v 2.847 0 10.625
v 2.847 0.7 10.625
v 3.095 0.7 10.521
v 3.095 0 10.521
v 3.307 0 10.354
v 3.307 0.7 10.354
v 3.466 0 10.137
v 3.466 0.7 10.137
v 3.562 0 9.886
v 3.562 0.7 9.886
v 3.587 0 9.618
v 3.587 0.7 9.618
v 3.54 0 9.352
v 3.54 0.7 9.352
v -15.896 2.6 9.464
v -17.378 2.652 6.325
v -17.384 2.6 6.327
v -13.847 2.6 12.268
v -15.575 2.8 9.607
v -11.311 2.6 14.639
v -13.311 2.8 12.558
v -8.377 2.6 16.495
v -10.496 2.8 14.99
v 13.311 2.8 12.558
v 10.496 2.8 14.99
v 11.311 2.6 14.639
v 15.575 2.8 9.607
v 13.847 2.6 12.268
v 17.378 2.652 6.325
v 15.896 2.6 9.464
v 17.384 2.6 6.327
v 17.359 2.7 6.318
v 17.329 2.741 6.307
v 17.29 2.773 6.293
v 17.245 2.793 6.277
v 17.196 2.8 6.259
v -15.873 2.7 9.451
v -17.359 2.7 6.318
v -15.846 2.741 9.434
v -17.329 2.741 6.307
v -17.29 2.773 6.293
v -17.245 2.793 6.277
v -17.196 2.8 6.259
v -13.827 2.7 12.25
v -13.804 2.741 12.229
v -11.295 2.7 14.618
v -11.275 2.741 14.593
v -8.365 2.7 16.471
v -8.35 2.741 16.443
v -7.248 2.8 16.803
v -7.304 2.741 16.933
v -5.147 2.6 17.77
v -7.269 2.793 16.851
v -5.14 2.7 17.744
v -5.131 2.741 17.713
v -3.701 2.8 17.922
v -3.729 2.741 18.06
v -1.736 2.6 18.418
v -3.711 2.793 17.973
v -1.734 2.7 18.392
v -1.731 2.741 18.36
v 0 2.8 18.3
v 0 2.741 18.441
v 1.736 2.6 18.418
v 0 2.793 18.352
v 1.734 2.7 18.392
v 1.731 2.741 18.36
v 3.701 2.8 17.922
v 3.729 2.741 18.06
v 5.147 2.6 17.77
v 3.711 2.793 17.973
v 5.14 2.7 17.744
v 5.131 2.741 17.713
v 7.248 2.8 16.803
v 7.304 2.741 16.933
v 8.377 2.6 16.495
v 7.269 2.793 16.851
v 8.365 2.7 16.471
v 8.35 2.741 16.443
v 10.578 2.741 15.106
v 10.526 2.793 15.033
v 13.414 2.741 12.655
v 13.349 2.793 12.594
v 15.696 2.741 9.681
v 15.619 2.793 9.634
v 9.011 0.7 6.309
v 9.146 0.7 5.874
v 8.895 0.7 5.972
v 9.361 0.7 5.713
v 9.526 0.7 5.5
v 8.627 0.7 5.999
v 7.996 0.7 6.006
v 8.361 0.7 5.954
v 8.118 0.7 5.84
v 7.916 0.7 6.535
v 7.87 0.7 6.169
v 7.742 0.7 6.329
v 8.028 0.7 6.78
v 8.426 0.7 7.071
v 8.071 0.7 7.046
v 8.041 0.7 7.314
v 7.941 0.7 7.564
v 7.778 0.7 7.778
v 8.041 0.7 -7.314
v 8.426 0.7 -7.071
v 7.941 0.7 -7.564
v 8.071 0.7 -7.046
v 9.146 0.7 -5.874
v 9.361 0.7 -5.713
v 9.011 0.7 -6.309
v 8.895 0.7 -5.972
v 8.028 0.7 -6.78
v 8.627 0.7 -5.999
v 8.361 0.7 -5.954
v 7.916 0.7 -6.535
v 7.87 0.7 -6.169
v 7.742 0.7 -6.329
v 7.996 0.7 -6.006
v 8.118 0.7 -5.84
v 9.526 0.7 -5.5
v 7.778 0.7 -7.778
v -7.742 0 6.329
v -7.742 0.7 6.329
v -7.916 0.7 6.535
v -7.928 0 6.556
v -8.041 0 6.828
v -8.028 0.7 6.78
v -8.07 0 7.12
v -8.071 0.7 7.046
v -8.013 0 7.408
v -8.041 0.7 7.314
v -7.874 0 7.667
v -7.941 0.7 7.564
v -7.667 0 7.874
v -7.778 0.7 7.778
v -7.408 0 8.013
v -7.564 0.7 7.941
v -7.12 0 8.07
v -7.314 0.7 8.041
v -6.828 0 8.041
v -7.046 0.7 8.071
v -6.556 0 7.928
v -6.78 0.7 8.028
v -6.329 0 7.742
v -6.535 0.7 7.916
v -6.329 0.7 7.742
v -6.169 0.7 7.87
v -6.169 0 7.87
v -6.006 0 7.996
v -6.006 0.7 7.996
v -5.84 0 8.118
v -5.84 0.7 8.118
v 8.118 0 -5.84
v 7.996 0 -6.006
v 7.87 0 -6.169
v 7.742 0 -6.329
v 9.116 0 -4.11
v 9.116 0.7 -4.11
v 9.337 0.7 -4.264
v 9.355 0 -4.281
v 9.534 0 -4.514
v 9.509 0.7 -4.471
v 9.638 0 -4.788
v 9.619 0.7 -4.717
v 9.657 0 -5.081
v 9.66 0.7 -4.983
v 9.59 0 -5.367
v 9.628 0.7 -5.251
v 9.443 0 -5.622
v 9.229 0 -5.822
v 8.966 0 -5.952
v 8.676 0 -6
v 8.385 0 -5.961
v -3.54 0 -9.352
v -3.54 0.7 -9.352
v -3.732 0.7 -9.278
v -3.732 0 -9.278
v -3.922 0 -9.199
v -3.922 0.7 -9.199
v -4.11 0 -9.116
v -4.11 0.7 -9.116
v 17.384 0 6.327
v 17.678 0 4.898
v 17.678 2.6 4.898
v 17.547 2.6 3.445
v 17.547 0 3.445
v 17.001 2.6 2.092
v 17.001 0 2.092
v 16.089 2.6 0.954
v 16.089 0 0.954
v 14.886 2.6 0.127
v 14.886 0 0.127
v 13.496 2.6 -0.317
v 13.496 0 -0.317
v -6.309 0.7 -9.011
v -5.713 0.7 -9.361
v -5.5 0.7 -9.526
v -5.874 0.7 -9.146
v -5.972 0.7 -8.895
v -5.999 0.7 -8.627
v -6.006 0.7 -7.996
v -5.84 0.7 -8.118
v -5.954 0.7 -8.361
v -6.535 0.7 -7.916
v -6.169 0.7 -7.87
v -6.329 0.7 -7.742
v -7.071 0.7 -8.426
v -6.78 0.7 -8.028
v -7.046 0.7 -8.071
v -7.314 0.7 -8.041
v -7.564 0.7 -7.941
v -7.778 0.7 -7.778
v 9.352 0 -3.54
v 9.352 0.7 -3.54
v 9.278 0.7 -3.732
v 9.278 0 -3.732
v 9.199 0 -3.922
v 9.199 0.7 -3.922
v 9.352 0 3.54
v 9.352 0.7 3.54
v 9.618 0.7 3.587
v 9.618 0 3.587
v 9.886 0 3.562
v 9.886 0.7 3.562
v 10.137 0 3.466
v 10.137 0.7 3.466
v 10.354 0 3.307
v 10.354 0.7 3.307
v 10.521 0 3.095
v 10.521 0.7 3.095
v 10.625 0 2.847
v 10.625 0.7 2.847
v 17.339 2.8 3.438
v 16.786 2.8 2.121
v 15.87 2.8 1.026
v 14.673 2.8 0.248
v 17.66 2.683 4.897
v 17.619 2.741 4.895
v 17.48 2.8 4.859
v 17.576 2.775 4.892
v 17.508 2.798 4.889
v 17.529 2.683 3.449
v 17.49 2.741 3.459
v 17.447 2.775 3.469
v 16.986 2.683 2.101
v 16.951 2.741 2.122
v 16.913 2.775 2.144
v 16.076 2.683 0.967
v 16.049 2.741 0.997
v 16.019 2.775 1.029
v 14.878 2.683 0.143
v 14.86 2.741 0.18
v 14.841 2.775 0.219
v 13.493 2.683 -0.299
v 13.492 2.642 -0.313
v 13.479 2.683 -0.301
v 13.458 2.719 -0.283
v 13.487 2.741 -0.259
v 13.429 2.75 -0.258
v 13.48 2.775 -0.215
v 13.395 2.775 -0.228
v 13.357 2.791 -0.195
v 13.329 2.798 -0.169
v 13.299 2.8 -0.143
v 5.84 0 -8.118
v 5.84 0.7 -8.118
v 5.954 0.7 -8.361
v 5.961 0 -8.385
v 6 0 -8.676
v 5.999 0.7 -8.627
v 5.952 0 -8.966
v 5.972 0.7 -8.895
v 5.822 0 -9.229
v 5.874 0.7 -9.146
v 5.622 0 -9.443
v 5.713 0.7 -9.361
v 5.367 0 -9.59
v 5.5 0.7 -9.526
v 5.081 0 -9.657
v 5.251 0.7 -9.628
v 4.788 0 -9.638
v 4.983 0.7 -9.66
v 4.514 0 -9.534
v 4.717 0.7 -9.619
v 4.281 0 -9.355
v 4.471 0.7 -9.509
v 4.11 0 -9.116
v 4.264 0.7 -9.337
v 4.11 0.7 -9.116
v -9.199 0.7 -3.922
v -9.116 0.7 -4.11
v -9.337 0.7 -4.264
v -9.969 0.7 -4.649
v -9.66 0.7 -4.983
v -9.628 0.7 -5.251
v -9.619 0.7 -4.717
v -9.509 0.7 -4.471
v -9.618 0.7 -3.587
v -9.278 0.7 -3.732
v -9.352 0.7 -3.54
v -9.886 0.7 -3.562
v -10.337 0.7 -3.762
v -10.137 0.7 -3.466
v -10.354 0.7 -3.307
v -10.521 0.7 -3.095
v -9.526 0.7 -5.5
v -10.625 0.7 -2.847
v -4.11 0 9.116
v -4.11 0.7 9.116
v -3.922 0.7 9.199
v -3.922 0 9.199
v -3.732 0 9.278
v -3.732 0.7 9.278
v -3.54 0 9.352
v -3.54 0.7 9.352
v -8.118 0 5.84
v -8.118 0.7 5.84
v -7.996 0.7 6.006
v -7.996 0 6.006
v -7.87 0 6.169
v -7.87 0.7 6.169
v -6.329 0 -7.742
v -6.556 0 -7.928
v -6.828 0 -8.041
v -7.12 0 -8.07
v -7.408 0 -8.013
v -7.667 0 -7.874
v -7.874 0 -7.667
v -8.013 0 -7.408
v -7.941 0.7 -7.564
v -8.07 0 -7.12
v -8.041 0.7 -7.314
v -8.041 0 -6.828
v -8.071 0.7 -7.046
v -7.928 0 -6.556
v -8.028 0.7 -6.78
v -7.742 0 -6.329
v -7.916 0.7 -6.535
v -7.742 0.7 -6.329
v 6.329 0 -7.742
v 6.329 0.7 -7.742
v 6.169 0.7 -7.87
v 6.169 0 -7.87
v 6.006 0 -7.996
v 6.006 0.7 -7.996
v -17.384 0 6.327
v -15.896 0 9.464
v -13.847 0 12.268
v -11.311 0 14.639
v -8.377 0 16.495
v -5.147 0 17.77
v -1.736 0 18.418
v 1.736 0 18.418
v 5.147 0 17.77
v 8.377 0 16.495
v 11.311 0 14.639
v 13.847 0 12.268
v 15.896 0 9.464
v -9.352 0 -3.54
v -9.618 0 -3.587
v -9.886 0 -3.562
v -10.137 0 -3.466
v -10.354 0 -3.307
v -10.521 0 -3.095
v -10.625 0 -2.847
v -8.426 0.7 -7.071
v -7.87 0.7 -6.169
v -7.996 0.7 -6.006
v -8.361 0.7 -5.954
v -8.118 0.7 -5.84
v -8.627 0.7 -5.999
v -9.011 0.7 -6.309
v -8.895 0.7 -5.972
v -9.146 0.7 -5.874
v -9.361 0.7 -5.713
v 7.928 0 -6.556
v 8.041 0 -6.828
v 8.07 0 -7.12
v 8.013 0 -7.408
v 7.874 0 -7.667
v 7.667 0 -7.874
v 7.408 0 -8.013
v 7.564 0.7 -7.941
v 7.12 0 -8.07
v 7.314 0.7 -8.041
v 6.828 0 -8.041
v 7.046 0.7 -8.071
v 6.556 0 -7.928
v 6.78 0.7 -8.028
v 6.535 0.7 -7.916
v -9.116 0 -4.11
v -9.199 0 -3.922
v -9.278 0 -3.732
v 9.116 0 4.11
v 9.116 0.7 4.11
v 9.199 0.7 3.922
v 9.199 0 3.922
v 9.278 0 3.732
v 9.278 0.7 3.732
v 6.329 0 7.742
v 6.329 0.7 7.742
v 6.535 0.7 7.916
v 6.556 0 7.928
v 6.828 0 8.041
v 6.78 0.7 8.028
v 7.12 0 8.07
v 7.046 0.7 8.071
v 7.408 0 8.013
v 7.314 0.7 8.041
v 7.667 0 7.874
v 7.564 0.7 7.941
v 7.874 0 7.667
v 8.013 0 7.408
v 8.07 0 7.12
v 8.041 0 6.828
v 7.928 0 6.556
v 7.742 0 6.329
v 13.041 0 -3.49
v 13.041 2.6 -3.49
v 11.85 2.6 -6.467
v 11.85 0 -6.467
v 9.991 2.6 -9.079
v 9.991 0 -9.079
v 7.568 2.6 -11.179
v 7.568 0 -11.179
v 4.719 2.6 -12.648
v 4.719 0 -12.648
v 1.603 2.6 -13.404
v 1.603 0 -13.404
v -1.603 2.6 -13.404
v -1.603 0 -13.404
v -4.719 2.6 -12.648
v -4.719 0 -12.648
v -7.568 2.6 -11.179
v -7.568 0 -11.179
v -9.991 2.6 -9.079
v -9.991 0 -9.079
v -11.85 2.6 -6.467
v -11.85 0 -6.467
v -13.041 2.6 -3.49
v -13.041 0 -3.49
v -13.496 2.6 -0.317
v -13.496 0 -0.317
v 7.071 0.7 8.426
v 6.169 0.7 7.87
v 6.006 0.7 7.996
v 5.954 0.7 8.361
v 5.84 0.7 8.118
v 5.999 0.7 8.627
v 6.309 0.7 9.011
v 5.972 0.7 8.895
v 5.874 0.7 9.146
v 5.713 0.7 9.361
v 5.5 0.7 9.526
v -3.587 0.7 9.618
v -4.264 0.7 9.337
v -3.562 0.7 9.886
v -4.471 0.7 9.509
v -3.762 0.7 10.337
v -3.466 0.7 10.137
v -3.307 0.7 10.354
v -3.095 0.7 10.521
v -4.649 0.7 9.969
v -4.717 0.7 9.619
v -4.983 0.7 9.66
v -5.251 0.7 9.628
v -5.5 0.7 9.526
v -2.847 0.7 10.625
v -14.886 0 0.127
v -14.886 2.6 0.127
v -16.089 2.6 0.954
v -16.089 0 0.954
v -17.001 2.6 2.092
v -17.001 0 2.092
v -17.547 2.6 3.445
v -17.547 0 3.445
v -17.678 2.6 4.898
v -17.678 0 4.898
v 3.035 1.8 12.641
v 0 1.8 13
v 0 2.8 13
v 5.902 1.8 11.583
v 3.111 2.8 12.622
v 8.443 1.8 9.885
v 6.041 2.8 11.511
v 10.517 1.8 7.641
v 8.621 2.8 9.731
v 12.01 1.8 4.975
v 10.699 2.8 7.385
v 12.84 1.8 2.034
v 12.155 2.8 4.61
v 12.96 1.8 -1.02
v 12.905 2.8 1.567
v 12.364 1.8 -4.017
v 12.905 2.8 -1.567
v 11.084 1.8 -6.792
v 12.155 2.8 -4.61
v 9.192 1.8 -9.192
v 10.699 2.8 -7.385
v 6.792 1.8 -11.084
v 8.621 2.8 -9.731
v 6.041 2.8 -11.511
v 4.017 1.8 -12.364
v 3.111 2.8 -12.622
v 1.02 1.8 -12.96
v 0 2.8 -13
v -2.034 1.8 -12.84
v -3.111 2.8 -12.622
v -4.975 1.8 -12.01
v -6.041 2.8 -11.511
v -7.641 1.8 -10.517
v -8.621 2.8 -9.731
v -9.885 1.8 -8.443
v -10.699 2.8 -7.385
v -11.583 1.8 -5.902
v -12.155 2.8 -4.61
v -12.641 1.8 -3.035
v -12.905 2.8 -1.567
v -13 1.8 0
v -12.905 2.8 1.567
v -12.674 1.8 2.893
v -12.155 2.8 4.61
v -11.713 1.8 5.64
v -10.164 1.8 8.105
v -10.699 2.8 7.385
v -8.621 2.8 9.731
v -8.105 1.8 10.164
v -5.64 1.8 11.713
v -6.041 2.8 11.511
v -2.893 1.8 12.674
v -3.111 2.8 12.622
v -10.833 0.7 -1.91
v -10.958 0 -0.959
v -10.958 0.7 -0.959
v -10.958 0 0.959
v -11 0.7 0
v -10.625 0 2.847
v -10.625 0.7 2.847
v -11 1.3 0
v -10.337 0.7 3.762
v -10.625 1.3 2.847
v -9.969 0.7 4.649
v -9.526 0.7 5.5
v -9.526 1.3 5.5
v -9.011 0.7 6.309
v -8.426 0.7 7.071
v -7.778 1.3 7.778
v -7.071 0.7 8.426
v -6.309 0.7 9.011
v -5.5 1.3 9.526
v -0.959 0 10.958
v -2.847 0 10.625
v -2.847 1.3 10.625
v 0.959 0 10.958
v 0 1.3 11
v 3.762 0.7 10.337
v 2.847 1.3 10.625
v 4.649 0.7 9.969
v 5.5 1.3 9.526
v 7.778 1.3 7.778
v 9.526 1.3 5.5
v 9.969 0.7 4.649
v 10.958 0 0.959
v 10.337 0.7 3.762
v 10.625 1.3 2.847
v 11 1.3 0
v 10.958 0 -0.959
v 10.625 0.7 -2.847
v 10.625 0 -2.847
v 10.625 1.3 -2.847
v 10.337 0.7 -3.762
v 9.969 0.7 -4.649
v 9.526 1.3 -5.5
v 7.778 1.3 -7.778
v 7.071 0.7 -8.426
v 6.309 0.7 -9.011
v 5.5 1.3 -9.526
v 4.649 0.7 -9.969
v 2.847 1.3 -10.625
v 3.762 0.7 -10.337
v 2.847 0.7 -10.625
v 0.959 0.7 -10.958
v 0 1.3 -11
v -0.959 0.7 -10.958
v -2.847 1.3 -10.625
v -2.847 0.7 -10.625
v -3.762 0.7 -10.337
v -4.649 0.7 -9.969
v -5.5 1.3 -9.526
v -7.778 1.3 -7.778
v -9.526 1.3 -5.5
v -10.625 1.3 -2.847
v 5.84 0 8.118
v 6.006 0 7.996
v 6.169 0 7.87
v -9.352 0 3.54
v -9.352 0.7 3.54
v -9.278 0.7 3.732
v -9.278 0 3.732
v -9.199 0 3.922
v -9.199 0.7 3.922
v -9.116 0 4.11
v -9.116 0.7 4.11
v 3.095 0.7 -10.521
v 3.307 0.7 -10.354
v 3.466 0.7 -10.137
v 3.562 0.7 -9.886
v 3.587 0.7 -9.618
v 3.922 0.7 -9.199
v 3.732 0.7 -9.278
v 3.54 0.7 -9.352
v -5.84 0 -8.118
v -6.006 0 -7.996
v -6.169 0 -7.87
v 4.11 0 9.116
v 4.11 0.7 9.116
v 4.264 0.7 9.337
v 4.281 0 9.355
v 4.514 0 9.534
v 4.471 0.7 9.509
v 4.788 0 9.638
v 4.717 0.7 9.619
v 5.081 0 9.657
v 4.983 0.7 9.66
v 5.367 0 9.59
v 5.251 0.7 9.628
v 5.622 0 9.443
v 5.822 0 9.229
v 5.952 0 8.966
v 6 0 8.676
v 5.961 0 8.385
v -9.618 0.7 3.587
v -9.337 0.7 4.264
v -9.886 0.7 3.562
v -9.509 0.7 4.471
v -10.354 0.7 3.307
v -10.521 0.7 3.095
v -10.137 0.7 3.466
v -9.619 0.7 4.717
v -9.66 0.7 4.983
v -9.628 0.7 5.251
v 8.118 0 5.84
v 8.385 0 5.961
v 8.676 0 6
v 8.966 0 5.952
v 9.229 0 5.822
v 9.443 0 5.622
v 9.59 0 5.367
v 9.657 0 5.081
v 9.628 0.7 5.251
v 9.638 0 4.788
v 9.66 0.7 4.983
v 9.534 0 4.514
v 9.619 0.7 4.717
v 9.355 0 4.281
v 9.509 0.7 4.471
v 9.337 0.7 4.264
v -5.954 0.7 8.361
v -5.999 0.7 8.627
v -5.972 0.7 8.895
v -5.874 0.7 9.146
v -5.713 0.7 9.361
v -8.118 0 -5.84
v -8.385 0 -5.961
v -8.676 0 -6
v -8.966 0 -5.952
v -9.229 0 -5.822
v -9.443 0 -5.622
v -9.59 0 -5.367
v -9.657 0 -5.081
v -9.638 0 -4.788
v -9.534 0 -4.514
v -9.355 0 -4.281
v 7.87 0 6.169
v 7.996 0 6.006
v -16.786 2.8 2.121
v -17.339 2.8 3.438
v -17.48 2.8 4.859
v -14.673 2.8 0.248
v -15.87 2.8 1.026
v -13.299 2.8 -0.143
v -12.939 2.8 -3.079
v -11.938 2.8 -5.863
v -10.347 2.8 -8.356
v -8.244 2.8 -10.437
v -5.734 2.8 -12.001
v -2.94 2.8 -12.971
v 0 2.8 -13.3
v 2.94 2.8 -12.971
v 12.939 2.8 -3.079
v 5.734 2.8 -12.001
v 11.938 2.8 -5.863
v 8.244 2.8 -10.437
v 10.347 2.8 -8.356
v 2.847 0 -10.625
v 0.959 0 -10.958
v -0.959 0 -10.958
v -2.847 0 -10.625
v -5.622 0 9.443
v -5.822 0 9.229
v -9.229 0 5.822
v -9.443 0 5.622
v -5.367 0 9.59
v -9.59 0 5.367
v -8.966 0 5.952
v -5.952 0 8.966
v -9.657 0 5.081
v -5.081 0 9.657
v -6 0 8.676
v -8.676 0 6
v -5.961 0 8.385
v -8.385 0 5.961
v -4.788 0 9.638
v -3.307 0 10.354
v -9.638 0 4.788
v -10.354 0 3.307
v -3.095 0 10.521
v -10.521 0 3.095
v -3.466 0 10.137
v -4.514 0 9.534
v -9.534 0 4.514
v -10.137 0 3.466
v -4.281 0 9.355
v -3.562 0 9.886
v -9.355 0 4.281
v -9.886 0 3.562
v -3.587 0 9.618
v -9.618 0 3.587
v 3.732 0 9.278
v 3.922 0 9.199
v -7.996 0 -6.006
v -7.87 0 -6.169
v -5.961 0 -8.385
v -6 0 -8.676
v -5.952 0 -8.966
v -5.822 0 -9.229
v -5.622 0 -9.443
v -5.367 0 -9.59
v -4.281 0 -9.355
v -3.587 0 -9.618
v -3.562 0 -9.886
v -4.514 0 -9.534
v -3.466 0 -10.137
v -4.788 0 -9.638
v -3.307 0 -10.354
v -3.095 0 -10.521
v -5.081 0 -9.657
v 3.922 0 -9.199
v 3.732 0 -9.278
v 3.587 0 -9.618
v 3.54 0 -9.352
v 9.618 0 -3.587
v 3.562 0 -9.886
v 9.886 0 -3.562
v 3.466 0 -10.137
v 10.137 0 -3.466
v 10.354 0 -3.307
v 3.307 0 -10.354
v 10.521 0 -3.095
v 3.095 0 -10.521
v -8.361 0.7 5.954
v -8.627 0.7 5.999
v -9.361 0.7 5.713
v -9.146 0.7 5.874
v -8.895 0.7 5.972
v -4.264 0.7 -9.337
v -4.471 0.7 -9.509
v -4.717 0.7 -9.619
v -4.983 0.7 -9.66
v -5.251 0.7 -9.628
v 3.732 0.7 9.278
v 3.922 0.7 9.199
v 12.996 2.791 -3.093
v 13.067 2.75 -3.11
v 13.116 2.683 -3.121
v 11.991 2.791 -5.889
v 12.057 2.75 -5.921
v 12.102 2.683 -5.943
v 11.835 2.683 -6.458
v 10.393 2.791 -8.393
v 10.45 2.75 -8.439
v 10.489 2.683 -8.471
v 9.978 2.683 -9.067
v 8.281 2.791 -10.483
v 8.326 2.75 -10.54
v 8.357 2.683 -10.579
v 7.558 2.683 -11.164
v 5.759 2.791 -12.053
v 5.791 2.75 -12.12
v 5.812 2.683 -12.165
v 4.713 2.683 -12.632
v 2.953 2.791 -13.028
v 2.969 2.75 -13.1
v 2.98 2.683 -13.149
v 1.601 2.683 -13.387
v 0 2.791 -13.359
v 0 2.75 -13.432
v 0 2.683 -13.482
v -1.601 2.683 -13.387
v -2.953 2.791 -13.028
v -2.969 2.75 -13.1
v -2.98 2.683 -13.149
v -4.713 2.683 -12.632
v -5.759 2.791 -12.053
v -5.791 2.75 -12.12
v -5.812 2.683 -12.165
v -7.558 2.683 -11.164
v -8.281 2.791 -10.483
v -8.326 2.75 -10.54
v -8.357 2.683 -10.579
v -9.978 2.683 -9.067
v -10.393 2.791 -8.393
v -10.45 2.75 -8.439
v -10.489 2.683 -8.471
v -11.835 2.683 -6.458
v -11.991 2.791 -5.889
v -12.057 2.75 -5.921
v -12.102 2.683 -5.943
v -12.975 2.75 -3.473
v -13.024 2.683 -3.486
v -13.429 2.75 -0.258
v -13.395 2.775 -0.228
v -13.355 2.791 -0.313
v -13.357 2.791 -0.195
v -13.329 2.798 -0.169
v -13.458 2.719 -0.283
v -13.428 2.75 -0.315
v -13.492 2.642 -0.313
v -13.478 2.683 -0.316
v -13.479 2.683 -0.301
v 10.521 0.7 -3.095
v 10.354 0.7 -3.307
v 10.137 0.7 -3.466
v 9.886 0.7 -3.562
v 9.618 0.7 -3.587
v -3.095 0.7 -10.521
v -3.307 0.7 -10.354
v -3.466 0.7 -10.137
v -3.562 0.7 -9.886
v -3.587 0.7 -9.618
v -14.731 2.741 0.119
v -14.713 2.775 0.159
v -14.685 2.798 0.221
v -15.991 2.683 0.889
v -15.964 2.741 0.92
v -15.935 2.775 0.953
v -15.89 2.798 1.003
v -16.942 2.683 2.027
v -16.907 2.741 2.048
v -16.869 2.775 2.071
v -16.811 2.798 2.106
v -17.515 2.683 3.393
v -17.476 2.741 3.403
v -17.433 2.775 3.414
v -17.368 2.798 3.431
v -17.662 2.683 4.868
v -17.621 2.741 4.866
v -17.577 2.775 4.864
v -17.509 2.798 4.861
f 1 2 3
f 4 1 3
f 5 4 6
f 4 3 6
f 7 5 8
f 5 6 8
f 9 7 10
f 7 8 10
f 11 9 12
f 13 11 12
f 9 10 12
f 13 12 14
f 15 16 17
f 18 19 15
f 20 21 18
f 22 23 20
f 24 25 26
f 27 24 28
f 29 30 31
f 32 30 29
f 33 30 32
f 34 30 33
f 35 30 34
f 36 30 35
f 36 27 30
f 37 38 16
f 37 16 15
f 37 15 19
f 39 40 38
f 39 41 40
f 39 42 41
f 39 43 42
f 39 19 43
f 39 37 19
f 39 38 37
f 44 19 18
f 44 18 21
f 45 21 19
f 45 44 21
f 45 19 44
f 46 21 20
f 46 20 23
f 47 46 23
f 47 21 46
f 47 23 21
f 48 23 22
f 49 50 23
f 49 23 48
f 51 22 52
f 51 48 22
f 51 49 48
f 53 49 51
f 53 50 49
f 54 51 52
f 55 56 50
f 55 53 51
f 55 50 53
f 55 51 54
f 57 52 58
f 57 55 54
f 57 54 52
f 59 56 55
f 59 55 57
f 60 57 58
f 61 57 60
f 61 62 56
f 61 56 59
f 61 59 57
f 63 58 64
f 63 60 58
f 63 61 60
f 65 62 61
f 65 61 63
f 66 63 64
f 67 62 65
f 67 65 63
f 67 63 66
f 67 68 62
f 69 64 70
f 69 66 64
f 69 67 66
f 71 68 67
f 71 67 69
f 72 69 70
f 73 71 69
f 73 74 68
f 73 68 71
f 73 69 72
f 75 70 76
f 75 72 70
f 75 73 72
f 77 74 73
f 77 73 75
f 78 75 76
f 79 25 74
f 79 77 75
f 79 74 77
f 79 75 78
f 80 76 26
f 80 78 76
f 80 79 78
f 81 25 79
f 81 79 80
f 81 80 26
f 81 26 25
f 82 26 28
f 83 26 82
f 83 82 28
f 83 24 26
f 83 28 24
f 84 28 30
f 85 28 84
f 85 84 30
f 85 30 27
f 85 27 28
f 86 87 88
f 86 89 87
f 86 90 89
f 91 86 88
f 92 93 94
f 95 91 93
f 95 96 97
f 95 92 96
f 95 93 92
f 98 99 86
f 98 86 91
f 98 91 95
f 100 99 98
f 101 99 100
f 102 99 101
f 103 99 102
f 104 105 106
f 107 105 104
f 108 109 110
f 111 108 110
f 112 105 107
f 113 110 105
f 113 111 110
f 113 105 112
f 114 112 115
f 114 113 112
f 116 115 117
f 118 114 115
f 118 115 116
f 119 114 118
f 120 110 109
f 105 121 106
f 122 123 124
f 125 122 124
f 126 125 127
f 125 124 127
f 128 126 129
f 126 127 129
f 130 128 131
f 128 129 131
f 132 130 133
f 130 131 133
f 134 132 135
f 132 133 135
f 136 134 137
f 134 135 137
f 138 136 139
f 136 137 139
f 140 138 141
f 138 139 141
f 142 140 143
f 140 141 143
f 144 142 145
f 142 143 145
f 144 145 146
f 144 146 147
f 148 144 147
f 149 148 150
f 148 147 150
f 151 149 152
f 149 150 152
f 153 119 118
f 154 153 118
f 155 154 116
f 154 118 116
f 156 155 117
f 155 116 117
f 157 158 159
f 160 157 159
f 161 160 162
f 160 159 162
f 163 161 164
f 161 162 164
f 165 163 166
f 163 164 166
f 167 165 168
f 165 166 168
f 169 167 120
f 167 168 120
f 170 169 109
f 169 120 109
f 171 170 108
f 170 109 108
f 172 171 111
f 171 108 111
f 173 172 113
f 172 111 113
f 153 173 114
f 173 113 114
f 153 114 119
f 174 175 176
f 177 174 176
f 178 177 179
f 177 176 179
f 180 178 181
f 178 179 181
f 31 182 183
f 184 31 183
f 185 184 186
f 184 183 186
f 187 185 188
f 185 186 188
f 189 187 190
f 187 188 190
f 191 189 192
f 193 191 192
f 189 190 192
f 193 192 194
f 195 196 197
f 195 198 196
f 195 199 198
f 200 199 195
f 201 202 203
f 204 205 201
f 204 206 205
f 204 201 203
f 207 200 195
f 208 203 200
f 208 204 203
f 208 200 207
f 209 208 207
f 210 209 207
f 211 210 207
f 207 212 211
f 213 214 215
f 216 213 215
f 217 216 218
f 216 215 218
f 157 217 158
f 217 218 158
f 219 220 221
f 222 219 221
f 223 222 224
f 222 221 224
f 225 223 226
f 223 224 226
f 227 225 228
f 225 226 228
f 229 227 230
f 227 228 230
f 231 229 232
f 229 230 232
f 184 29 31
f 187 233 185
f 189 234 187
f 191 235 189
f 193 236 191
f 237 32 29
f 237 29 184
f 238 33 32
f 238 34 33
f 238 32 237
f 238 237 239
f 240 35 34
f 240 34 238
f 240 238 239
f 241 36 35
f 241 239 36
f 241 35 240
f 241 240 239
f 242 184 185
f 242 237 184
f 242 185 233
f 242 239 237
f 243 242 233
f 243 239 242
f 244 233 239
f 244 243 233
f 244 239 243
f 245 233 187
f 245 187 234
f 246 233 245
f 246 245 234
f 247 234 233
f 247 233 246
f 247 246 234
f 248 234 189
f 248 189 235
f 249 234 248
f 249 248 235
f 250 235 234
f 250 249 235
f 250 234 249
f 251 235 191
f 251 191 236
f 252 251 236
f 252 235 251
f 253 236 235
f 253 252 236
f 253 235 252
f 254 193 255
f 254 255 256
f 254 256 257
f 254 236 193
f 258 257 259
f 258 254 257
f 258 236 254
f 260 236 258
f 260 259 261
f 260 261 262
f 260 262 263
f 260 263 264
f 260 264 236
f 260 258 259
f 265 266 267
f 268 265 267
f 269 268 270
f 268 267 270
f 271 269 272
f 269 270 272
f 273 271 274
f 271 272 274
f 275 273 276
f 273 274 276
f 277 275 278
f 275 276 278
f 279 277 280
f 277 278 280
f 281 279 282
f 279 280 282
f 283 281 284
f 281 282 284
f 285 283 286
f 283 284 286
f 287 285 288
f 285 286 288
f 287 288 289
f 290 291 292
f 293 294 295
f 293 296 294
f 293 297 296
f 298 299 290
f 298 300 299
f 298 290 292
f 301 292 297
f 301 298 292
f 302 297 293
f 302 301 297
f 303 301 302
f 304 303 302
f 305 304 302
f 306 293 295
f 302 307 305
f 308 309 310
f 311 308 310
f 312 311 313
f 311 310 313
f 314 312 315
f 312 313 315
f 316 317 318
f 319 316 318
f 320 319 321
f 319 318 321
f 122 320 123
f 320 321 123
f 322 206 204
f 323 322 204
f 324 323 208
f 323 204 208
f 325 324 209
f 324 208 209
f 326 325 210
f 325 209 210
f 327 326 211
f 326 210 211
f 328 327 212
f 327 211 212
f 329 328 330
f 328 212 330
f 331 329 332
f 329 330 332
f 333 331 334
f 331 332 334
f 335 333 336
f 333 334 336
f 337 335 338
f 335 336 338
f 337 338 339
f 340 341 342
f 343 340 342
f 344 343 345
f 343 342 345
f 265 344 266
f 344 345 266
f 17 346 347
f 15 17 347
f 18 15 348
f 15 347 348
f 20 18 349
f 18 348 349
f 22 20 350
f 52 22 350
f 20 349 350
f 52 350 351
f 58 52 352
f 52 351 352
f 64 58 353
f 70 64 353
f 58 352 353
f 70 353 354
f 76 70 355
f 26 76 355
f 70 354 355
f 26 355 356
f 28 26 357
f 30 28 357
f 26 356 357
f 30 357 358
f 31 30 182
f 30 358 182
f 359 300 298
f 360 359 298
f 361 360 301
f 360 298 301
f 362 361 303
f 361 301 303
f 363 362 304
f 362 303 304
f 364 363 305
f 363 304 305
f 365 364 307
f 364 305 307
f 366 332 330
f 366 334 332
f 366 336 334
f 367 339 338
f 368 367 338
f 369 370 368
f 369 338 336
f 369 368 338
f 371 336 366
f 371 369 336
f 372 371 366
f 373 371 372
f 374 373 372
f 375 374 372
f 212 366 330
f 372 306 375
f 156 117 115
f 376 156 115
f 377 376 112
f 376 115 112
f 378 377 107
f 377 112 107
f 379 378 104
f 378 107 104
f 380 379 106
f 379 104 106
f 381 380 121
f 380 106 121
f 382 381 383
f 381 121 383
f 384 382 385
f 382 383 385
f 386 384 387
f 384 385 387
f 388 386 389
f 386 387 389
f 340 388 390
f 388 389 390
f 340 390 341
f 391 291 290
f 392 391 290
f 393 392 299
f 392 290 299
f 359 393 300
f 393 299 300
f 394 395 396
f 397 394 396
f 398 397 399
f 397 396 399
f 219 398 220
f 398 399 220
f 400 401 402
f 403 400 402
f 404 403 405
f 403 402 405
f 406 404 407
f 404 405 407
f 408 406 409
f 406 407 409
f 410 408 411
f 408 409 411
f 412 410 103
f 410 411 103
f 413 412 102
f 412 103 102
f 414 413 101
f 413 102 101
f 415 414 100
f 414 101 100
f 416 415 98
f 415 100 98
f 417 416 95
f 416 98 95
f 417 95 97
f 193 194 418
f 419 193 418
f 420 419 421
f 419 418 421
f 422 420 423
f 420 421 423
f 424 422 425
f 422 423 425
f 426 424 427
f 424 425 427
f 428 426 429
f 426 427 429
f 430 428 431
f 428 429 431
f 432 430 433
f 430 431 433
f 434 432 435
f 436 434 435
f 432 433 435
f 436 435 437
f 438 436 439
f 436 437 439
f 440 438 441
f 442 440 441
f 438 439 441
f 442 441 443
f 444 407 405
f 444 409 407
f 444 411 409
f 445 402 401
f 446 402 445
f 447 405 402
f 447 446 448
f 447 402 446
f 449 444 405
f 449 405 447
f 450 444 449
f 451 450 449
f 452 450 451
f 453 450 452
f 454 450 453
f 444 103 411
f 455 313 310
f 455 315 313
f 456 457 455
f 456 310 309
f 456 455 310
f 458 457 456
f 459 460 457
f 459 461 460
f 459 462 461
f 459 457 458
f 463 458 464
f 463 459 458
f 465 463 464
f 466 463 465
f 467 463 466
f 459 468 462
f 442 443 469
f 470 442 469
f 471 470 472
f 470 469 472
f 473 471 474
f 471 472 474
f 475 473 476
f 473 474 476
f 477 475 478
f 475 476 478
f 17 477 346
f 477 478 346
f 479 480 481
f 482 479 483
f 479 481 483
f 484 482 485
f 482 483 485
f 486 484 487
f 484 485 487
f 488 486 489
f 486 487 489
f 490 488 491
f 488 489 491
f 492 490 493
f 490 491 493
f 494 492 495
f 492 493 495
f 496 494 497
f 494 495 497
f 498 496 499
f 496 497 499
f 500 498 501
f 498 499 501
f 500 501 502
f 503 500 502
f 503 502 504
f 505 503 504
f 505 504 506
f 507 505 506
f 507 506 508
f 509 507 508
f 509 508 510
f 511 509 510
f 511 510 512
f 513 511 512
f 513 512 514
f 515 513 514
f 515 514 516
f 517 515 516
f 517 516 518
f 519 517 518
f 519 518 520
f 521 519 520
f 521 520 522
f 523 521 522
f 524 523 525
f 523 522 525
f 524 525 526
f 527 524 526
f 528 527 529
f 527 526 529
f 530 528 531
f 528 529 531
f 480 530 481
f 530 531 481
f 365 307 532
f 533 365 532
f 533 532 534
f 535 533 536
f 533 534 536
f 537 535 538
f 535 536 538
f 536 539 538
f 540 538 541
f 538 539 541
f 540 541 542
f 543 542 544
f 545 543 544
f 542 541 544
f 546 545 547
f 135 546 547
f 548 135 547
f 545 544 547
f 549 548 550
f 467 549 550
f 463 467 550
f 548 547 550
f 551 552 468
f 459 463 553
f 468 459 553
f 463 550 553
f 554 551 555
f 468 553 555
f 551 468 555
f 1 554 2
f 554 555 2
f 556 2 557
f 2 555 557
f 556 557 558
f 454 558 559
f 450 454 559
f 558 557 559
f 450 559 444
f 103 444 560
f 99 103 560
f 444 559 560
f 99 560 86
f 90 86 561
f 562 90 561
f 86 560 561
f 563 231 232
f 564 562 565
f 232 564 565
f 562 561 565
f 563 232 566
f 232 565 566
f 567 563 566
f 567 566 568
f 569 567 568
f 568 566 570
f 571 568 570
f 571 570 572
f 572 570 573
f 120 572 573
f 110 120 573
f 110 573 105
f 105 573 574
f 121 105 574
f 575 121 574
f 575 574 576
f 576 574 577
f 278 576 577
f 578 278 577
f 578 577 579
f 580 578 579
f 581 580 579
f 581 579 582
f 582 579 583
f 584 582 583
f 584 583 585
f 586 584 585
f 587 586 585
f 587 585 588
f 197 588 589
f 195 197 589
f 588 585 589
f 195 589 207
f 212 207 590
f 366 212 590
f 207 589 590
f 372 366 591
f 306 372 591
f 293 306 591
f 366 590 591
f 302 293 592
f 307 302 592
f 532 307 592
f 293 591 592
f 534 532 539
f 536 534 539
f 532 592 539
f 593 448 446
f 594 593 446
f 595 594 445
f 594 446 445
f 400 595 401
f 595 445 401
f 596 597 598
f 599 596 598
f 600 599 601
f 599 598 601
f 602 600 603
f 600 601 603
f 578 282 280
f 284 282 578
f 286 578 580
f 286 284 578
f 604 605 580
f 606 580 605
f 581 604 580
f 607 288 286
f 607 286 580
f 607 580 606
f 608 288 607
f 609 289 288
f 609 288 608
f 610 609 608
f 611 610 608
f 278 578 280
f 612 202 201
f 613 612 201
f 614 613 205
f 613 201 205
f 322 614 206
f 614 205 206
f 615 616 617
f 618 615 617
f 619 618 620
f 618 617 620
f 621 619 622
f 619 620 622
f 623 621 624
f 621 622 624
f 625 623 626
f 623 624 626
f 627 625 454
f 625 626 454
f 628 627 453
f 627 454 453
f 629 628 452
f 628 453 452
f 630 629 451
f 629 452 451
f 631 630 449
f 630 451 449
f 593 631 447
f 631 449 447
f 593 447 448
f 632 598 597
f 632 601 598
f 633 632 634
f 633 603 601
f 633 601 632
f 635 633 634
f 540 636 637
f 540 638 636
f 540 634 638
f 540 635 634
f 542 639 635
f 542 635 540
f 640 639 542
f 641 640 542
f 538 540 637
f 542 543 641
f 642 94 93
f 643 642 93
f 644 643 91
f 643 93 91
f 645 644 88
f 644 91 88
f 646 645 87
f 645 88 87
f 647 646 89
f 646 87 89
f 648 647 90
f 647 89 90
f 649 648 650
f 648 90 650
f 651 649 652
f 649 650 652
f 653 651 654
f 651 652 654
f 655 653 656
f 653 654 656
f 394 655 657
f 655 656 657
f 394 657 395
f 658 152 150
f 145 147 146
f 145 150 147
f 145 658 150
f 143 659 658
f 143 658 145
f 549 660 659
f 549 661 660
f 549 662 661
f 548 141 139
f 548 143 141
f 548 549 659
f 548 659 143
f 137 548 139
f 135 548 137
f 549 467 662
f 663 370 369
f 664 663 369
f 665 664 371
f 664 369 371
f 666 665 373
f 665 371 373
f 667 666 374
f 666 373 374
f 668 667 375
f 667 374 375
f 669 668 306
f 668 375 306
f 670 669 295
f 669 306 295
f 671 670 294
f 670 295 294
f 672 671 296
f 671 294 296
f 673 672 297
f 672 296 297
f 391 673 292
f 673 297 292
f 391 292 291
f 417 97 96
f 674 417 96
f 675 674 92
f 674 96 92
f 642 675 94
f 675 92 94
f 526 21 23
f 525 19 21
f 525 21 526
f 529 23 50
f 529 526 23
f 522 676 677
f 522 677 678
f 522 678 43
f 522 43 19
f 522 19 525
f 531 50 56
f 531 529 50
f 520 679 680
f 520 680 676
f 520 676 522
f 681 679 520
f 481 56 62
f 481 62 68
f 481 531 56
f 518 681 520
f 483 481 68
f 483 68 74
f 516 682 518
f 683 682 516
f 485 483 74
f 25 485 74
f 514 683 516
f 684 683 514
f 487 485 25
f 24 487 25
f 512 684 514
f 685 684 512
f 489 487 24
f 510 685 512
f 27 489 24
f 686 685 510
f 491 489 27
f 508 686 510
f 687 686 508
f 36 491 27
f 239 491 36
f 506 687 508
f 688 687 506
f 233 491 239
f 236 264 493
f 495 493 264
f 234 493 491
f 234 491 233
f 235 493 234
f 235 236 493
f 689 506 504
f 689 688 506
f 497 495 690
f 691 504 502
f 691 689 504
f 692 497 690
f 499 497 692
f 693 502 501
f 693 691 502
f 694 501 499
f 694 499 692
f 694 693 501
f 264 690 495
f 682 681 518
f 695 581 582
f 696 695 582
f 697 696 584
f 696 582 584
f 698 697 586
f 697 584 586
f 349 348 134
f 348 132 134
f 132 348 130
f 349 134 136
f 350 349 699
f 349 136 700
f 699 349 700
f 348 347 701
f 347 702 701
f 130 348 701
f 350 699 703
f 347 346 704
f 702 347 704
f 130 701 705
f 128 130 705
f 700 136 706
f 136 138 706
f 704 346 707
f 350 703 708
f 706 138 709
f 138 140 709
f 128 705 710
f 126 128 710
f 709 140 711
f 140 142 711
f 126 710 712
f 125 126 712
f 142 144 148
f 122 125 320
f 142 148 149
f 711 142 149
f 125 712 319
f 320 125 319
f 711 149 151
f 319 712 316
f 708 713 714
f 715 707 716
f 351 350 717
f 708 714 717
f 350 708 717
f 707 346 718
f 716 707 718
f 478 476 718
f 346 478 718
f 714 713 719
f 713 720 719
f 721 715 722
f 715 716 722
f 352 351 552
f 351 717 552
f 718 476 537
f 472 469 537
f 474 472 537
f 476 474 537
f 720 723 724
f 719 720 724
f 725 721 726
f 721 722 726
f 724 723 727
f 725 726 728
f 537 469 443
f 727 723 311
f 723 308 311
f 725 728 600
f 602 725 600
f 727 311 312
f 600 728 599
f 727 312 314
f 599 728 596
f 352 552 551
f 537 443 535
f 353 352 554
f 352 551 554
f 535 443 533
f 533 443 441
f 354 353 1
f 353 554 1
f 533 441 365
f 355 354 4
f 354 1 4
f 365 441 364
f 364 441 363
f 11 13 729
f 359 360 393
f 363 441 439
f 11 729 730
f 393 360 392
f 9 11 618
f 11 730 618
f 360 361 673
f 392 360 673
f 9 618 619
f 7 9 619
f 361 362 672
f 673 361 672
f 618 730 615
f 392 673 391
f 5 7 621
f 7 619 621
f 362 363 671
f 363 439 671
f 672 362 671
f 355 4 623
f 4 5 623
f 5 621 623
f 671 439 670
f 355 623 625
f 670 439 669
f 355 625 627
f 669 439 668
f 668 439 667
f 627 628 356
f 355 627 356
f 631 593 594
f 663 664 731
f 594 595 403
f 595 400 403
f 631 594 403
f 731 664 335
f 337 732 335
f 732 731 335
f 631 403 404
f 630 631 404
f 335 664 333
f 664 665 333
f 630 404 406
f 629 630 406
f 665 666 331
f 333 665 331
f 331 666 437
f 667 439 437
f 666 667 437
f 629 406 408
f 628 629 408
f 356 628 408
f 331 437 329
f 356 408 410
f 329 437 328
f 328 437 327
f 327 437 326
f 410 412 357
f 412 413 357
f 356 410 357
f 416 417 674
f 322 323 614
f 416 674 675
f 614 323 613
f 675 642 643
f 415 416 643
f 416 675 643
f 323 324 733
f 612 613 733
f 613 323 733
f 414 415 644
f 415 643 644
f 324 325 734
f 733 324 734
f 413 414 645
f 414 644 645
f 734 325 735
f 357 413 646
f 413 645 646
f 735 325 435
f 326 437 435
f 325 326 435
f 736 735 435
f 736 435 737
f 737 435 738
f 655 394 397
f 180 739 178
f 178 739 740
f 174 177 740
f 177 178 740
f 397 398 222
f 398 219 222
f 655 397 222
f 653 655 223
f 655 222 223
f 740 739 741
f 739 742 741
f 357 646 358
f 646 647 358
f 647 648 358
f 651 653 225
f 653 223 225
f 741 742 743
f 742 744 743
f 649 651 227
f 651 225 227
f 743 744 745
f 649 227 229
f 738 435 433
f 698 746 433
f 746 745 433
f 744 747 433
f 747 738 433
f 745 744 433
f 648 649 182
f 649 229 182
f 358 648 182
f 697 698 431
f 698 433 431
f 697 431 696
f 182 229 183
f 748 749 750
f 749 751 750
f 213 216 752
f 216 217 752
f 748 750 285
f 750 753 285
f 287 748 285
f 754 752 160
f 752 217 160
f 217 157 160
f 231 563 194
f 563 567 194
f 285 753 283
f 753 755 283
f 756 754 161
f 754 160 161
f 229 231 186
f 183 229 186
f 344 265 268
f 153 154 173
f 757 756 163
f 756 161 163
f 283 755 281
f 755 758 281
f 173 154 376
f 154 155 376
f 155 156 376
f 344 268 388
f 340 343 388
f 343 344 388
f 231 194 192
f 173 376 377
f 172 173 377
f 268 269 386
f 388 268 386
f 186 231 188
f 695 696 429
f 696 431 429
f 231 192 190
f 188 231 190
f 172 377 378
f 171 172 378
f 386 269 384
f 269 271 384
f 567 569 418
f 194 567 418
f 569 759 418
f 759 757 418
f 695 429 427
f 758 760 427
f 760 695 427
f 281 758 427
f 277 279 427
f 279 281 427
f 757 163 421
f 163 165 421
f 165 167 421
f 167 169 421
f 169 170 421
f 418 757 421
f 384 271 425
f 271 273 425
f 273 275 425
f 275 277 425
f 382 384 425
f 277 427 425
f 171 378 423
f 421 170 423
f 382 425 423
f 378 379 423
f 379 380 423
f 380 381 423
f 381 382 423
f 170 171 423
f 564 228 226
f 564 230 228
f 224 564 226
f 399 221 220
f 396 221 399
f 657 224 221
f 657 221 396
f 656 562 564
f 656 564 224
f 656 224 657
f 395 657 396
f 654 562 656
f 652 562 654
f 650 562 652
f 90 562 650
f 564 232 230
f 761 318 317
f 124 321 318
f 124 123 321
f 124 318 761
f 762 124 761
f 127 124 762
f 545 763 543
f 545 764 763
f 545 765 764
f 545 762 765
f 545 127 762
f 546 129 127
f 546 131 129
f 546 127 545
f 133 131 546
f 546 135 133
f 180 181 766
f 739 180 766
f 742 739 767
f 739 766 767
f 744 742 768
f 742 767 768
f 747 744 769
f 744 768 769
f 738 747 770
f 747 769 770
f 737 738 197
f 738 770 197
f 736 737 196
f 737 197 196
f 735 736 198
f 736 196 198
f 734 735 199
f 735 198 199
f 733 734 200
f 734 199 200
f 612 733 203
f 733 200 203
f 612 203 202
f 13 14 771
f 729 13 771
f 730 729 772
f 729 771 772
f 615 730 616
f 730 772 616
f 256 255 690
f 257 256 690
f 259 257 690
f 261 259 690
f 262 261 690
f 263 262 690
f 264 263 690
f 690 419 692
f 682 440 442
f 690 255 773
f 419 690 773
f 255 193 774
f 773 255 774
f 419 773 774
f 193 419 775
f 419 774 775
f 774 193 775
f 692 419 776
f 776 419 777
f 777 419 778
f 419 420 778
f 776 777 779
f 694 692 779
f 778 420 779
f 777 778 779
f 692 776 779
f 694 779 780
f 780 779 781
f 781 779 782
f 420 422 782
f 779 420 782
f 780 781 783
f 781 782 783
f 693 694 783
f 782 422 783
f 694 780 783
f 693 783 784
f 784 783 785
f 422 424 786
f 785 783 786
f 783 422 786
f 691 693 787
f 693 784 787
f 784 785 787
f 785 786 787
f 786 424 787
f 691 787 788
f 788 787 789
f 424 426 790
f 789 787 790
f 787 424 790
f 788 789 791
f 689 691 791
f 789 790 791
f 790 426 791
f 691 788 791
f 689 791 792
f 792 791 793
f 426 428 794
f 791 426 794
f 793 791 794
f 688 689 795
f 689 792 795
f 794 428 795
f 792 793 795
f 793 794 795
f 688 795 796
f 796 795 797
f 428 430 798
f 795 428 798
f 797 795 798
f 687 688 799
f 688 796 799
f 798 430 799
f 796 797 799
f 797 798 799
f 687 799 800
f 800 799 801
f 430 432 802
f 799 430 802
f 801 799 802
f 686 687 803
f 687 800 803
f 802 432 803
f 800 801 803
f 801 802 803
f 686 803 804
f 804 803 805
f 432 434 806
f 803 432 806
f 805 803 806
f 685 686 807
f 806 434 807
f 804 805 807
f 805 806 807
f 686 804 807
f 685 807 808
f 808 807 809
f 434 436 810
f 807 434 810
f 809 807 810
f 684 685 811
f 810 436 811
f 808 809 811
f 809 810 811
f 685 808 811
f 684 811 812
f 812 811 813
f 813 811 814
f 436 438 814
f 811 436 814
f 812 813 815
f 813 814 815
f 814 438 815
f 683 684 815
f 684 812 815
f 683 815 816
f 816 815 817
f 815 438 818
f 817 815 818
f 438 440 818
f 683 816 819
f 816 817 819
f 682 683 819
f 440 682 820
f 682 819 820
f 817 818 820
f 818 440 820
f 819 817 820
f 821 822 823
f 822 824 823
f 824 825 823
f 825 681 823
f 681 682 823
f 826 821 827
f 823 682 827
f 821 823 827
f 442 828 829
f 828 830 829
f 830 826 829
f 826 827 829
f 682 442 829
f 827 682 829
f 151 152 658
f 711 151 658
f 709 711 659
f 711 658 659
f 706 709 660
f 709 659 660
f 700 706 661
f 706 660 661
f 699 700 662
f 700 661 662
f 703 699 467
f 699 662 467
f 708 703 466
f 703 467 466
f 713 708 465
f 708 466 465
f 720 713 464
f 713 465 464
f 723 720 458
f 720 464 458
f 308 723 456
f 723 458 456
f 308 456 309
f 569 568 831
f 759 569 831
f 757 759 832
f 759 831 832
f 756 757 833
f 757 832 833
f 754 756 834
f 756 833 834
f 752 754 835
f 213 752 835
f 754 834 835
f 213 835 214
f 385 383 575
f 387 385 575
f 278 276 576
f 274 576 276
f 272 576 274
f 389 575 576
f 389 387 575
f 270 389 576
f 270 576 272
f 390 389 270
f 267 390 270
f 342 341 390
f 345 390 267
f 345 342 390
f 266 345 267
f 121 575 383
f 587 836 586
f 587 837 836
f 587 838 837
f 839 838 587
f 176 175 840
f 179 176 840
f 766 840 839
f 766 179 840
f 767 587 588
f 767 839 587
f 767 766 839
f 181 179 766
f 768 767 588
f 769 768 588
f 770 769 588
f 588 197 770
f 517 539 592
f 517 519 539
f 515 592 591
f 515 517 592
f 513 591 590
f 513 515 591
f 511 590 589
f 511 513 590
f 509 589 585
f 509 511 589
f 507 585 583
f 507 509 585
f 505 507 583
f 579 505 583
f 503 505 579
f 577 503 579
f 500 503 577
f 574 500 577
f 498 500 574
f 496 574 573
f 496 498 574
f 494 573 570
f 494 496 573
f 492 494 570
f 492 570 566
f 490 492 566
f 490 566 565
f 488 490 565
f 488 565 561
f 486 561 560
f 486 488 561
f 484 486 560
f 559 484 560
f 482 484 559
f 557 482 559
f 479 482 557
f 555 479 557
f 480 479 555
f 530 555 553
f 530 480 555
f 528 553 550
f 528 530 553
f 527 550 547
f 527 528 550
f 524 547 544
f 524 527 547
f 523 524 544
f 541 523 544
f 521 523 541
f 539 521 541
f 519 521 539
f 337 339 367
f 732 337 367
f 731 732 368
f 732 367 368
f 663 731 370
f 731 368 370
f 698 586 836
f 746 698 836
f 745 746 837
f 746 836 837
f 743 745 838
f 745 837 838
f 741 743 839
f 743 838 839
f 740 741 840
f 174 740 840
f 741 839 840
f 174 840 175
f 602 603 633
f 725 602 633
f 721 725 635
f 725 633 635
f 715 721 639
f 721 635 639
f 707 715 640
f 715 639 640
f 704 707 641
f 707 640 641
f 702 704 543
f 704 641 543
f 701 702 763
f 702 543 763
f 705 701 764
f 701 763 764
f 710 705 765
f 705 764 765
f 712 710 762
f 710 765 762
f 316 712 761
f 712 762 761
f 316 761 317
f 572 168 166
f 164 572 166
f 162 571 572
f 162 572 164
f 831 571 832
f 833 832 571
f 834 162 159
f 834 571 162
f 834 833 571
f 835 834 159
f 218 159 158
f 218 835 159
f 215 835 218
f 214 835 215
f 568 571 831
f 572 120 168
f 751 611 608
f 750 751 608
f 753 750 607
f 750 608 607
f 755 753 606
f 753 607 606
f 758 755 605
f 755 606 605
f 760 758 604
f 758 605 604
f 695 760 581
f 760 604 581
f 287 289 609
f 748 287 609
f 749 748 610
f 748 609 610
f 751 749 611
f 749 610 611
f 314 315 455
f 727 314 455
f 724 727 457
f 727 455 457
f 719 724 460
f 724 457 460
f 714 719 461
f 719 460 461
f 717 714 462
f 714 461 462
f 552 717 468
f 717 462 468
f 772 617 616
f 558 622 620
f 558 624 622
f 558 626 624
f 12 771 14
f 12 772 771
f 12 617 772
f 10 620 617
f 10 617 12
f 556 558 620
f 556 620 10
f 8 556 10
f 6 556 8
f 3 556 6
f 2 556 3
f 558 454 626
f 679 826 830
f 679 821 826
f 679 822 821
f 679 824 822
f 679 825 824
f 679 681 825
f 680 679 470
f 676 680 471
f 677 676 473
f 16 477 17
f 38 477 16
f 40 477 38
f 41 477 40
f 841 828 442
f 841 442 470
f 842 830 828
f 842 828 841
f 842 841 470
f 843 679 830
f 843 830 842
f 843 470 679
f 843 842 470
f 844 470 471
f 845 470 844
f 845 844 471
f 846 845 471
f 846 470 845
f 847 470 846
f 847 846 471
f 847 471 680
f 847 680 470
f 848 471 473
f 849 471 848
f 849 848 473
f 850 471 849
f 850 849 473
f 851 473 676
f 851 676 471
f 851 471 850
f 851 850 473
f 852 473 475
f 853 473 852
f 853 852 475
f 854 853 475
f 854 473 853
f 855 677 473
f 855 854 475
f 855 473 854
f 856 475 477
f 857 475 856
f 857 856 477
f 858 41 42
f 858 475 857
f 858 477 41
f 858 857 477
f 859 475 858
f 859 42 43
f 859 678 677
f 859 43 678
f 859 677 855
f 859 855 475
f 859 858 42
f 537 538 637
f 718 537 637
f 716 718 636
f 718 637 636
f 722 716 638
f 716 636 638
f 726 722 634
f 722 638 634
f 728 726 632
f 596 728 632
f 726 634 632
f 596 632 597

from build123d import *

# Parameters (mm, degrees)
SKETCH_1_R          = 13.5
EXTRUDE_1_DEPTH     = 2.8
SKETCH_2_R          = 13
CUT_EXTRUDE_1_DEPTH = 1
SKETCH_5_R          = 11
CUT_EXTRUDE_2_DEPTH = 0.6
CUT_EXTRUDE_3_DEPTH = 0.7
EXTRUDE_2_DEPTH     = 2.8
FILLET_1_R          = 0.2


with BuildPart() as part:
    # 草图1 → 凸台-拉伸1 (new body)
    with BuildSketch(Plane(origin=(0, 0, 0), x_dir=(1, 0, 0), z_dir=(0, 1, 0))):
        with Locations(Location((0, 0, 0), (0, 0, 270))):
            Circle(SKETCH_1_R)
    extrude(amount=EXTRUDE_1_DEPTH)

    # 草图2 → 切除-拉伸1 (cut)
    with BuildSketch(Plane(origin=(0, 2.8, 0), x_dir=(1, 0, 0), z_dir=(0, 1, 0))):
        with Locations(Location((0, 0, 0), (0, 0, 270))):
            Circle(SKETCH_2_R)
    extrude(amount=-CUT_EXTRUDE_1_DEPTH, mode=Mode.SUBTRACT)

    # 草图4 → 切除-旋转1 (revolve, cut)
    with BuildSketch(Plane.XY):
        Polygon((0, 1.3), (-11, 1.3), (-13, 1.8), (0, 1.8), align=None)
    revolve(axis=Axis((0, 1.8, 0), (0, -1, 0)), mode=Mode.SUBTRACT)

    # 草图5 → 切除-拉伸2 (cut)
    with BuildSketch(Plane(origin=(0, 1.3, 0), x_dir=(1, 0, 0), z_dir=(0, 1, 0))):
        with Locations(Location((0, 0, 0), (0, 0, 180))):
            Circle(SKETCH_5_R)
    extrude(amount=-CUT_EXTRUDE_2_DEPTH, mode=Mode.SUBTRACT)

    # 草图6 → 切除-拉伸3 (cut)
    with BuildSketch(Plane(origin=(0, 0.7, 0), x_dir=(1, 0, 0), z_dir=(0, 1, 0))):
        with BuildLine():
            ThreePointArc((-3.539967162, 9.352466653), (-3.826834324, 9.238795325), (-4.110057805, 9.116327377))
            ThreePointArc((-4.110057805, 9.116327377), (-5.5, 9.526279442), (-5.839942195, 8.117578159))
            ThreePointArc((-5.839942195, 8.117578159), (-6.08761429, 7.933533403), (-6.329490128, 7.741934817))
            ThreePointArc((-6.329490128, 7.741934817), (-7.778174593, 7.778174593), (-7.741934817, 6.329490128))
            ThreePointArc((-7.741934817, 6.329490128), (-7.933533403, 6.08761429), (-8.117578159, 5.839942195))
            ThreePointArc((-8.117578159, 5.839942195), (-9.526279442, 5.5), (-9.116327377, 4.110057805))
            ThreePointArc((-9.116327377, 4.110057805), (-9.238795325, 3.826834324), (-9.352466653, 3.539967162))
            ThreePointArc((-9.352466653, 3.539967162), (-10.137444482, 3.466448921), (-10.625184089, 2.847009496))
            ThreePointArc((-10.625184089, 2.847009496), (-11, 0), (-10.625184089, -2.847009496))
            ThreePointArc((-10.625184089, -2.847009496), (-10.137444482, -3.466448921), (-9.352466653, -3.539967162))
            ThreePointArc((-9.352466653, -3.539967162), (-9.238795325, -3.826834324), (-9.116327377, -4.110057805))
            ThreePointArc((-9.116327377, -4.110057805), (-9.526279442, -5.5), (-8.117578159, -5.839942195))
            ThreePointArc((-8.117578159, -5.839942195), (-7.933533403, -6.08761429), (-7.741934817, -6.329490128))
            ThreePointArc((-7.741934817, -6.329490128), (-7.778174593, -7.778174593), (-6.329490128, -7.741934817))
            ThreePointArc((-6.329490128, -7.741934817), (-6.08761429, -7.933533403), (-5.839942195, -8.117578159))
            ThreePointArc((-5.839942195, -8.117578159), (-5.5, -9.526279442), (-4.110057805, -9.116327377))
            ThreePointArc((-4.110057805, -9.116327377), (-3.826834324, -9.238795325), (-3.539967162, -9.352466653))
            ThreePointArc((-3.539967162, -9.352466653), (-3.466448921, -10.137444482), (-2.847009496, -10.625184089))
            ThreePointArc((-2.847009496, -10.625184089), (0, -11), (2.847009496, -10.625184089))
            ThreePointArc((2.847009496, -10.625184089), (3.466448921, -10.137444482), (3.539967162, -9.352466653))
            ThreePointArc((3.539967162, -9.352466653), (3.826834324, -9.238795325), (4.110057805, -9.116327377))
            ThreePointArc((4.110057805, -9.116327377), (5.5, -9.526279442), (5.839942195, -8.117578159))
            ThreePointArc((5.839942195, -8.117578159), (6.08761429, -7.933533403), (6.329490128, -7.741934817))
            ThreePointArc((6.329490128, -7.741934817), (7.778174593, -7.778174593), (7.741934817, -6.329490128))
            ThreePointArc((7.741934817, -6.329490128), (7.933533403, -6.08761429), (8.117578159, -5.839942195))
            ThreePointArc((8.117578159, -5.839942195), (9.526279442, -5.5), (9.116327377, -4.110057805))
            ThreePointArc((9.116327377, -4.110057805), (9.238795325, -3.826834324), (9.352466653, -3.539967162))
            ThreePointArc((9.352466653, -3.539967162), (10.137444482, -3.466448921), (10.625184089, -2.847009496))
            ThreePointArc((10.625184089, -2.847009496), (11, 0), (10.625184089, 2.847009496))
            ThreePointArc((10.625184089, 2.847009496), (10.137444482, 3.466448921), (9.352466653, 3.539967162))
            ThreePointArc((9.352466653, 3.539967162), (9.238795325, 3.826834324), (9.116327377, 4.110057805))
            ThreePointArc((9.116327377, 4.110057805), (9.526279442, 5.5), (8.117578159, 5.839942195))
            ThreePointArc((8.117578159, 5.839942195), (7.933533403, 6.08761429), (7.741934817, 6.329490128))
            ThreePointArc((7.741934817, 6.329490128), (7.778174593, 7.778174593), (6.329490128, 7.741934817))
            ThreePointArc((6.329490128, 7.741934817), (6.08761429, 7.933533403), (5.839942195, 8.117578159))
            ThreePointArc((5.839942195, 8.117578159), (5.5, 9.526279442), (4.110057805, 9.116327377))
            ThreePointArc((4.110057805, 9.116327377), (3.826834324, 9.238795325), (3.539967162, 9.352466653))
            ThreePointArc((3.539967162, 9.352466653), (3.466448921, 10.137444482), (2.847009496, 10.625184089))
            ThreePointArc((2.847009496, 10.625184089), (0, 11), (-2.847009496, 10.625184089))
            ThreePointArc((-2.847009496, 10.625184089), (-3.466448921, 10.137444482), (-3.539967162, 9.352466653))
        make_face()
    extrude(amount=-CUT_EXTRUDE_3_DEPTH, mode=Mode.SUBTRACT)

    # 草图7 → 凸台-拉伸2 (add)
    with BuildSketch(Plane(origin=(0, 0, 0), x_dir=(1, 0, 0), z_dir=(0, 1, 0))):
        with BuildLine():
            ThreePointArc((-17.384313485, -6.327372652), (0, -18.5), (17.384313485, -6.327372652))
            ThreePointArc((17.384313485, -6.327372652), (17.00124382, -2.09192454), (13.496286822, 0.316610185))
            ThreePointArc((13.496286822, 0.316610185), (0, -13.5), (-13.496286822, 0.316610185))
            ThreePointArc((-13.496286822, 0.316610185), (-17.00124382, -2.09192454), (-17.384313485, -6.327372652))
        make_face()
    extrude(amount=EXTRUDE_2_DEPTH)

    # 圆角1
    fillet_1_edges = [part.edges().sort_by_distance(p)[0] for p in [
        (-17.00124382, 2.8, 2.09192454),
        (0, 2.8, 18.5),
        (17.00124382, 2.8, 2.09192454),
        (0, 2.8, -13.5),
    ]]
    fillet(fillet_1_edges, radius=FILLET_1_R)


solid = part.part
